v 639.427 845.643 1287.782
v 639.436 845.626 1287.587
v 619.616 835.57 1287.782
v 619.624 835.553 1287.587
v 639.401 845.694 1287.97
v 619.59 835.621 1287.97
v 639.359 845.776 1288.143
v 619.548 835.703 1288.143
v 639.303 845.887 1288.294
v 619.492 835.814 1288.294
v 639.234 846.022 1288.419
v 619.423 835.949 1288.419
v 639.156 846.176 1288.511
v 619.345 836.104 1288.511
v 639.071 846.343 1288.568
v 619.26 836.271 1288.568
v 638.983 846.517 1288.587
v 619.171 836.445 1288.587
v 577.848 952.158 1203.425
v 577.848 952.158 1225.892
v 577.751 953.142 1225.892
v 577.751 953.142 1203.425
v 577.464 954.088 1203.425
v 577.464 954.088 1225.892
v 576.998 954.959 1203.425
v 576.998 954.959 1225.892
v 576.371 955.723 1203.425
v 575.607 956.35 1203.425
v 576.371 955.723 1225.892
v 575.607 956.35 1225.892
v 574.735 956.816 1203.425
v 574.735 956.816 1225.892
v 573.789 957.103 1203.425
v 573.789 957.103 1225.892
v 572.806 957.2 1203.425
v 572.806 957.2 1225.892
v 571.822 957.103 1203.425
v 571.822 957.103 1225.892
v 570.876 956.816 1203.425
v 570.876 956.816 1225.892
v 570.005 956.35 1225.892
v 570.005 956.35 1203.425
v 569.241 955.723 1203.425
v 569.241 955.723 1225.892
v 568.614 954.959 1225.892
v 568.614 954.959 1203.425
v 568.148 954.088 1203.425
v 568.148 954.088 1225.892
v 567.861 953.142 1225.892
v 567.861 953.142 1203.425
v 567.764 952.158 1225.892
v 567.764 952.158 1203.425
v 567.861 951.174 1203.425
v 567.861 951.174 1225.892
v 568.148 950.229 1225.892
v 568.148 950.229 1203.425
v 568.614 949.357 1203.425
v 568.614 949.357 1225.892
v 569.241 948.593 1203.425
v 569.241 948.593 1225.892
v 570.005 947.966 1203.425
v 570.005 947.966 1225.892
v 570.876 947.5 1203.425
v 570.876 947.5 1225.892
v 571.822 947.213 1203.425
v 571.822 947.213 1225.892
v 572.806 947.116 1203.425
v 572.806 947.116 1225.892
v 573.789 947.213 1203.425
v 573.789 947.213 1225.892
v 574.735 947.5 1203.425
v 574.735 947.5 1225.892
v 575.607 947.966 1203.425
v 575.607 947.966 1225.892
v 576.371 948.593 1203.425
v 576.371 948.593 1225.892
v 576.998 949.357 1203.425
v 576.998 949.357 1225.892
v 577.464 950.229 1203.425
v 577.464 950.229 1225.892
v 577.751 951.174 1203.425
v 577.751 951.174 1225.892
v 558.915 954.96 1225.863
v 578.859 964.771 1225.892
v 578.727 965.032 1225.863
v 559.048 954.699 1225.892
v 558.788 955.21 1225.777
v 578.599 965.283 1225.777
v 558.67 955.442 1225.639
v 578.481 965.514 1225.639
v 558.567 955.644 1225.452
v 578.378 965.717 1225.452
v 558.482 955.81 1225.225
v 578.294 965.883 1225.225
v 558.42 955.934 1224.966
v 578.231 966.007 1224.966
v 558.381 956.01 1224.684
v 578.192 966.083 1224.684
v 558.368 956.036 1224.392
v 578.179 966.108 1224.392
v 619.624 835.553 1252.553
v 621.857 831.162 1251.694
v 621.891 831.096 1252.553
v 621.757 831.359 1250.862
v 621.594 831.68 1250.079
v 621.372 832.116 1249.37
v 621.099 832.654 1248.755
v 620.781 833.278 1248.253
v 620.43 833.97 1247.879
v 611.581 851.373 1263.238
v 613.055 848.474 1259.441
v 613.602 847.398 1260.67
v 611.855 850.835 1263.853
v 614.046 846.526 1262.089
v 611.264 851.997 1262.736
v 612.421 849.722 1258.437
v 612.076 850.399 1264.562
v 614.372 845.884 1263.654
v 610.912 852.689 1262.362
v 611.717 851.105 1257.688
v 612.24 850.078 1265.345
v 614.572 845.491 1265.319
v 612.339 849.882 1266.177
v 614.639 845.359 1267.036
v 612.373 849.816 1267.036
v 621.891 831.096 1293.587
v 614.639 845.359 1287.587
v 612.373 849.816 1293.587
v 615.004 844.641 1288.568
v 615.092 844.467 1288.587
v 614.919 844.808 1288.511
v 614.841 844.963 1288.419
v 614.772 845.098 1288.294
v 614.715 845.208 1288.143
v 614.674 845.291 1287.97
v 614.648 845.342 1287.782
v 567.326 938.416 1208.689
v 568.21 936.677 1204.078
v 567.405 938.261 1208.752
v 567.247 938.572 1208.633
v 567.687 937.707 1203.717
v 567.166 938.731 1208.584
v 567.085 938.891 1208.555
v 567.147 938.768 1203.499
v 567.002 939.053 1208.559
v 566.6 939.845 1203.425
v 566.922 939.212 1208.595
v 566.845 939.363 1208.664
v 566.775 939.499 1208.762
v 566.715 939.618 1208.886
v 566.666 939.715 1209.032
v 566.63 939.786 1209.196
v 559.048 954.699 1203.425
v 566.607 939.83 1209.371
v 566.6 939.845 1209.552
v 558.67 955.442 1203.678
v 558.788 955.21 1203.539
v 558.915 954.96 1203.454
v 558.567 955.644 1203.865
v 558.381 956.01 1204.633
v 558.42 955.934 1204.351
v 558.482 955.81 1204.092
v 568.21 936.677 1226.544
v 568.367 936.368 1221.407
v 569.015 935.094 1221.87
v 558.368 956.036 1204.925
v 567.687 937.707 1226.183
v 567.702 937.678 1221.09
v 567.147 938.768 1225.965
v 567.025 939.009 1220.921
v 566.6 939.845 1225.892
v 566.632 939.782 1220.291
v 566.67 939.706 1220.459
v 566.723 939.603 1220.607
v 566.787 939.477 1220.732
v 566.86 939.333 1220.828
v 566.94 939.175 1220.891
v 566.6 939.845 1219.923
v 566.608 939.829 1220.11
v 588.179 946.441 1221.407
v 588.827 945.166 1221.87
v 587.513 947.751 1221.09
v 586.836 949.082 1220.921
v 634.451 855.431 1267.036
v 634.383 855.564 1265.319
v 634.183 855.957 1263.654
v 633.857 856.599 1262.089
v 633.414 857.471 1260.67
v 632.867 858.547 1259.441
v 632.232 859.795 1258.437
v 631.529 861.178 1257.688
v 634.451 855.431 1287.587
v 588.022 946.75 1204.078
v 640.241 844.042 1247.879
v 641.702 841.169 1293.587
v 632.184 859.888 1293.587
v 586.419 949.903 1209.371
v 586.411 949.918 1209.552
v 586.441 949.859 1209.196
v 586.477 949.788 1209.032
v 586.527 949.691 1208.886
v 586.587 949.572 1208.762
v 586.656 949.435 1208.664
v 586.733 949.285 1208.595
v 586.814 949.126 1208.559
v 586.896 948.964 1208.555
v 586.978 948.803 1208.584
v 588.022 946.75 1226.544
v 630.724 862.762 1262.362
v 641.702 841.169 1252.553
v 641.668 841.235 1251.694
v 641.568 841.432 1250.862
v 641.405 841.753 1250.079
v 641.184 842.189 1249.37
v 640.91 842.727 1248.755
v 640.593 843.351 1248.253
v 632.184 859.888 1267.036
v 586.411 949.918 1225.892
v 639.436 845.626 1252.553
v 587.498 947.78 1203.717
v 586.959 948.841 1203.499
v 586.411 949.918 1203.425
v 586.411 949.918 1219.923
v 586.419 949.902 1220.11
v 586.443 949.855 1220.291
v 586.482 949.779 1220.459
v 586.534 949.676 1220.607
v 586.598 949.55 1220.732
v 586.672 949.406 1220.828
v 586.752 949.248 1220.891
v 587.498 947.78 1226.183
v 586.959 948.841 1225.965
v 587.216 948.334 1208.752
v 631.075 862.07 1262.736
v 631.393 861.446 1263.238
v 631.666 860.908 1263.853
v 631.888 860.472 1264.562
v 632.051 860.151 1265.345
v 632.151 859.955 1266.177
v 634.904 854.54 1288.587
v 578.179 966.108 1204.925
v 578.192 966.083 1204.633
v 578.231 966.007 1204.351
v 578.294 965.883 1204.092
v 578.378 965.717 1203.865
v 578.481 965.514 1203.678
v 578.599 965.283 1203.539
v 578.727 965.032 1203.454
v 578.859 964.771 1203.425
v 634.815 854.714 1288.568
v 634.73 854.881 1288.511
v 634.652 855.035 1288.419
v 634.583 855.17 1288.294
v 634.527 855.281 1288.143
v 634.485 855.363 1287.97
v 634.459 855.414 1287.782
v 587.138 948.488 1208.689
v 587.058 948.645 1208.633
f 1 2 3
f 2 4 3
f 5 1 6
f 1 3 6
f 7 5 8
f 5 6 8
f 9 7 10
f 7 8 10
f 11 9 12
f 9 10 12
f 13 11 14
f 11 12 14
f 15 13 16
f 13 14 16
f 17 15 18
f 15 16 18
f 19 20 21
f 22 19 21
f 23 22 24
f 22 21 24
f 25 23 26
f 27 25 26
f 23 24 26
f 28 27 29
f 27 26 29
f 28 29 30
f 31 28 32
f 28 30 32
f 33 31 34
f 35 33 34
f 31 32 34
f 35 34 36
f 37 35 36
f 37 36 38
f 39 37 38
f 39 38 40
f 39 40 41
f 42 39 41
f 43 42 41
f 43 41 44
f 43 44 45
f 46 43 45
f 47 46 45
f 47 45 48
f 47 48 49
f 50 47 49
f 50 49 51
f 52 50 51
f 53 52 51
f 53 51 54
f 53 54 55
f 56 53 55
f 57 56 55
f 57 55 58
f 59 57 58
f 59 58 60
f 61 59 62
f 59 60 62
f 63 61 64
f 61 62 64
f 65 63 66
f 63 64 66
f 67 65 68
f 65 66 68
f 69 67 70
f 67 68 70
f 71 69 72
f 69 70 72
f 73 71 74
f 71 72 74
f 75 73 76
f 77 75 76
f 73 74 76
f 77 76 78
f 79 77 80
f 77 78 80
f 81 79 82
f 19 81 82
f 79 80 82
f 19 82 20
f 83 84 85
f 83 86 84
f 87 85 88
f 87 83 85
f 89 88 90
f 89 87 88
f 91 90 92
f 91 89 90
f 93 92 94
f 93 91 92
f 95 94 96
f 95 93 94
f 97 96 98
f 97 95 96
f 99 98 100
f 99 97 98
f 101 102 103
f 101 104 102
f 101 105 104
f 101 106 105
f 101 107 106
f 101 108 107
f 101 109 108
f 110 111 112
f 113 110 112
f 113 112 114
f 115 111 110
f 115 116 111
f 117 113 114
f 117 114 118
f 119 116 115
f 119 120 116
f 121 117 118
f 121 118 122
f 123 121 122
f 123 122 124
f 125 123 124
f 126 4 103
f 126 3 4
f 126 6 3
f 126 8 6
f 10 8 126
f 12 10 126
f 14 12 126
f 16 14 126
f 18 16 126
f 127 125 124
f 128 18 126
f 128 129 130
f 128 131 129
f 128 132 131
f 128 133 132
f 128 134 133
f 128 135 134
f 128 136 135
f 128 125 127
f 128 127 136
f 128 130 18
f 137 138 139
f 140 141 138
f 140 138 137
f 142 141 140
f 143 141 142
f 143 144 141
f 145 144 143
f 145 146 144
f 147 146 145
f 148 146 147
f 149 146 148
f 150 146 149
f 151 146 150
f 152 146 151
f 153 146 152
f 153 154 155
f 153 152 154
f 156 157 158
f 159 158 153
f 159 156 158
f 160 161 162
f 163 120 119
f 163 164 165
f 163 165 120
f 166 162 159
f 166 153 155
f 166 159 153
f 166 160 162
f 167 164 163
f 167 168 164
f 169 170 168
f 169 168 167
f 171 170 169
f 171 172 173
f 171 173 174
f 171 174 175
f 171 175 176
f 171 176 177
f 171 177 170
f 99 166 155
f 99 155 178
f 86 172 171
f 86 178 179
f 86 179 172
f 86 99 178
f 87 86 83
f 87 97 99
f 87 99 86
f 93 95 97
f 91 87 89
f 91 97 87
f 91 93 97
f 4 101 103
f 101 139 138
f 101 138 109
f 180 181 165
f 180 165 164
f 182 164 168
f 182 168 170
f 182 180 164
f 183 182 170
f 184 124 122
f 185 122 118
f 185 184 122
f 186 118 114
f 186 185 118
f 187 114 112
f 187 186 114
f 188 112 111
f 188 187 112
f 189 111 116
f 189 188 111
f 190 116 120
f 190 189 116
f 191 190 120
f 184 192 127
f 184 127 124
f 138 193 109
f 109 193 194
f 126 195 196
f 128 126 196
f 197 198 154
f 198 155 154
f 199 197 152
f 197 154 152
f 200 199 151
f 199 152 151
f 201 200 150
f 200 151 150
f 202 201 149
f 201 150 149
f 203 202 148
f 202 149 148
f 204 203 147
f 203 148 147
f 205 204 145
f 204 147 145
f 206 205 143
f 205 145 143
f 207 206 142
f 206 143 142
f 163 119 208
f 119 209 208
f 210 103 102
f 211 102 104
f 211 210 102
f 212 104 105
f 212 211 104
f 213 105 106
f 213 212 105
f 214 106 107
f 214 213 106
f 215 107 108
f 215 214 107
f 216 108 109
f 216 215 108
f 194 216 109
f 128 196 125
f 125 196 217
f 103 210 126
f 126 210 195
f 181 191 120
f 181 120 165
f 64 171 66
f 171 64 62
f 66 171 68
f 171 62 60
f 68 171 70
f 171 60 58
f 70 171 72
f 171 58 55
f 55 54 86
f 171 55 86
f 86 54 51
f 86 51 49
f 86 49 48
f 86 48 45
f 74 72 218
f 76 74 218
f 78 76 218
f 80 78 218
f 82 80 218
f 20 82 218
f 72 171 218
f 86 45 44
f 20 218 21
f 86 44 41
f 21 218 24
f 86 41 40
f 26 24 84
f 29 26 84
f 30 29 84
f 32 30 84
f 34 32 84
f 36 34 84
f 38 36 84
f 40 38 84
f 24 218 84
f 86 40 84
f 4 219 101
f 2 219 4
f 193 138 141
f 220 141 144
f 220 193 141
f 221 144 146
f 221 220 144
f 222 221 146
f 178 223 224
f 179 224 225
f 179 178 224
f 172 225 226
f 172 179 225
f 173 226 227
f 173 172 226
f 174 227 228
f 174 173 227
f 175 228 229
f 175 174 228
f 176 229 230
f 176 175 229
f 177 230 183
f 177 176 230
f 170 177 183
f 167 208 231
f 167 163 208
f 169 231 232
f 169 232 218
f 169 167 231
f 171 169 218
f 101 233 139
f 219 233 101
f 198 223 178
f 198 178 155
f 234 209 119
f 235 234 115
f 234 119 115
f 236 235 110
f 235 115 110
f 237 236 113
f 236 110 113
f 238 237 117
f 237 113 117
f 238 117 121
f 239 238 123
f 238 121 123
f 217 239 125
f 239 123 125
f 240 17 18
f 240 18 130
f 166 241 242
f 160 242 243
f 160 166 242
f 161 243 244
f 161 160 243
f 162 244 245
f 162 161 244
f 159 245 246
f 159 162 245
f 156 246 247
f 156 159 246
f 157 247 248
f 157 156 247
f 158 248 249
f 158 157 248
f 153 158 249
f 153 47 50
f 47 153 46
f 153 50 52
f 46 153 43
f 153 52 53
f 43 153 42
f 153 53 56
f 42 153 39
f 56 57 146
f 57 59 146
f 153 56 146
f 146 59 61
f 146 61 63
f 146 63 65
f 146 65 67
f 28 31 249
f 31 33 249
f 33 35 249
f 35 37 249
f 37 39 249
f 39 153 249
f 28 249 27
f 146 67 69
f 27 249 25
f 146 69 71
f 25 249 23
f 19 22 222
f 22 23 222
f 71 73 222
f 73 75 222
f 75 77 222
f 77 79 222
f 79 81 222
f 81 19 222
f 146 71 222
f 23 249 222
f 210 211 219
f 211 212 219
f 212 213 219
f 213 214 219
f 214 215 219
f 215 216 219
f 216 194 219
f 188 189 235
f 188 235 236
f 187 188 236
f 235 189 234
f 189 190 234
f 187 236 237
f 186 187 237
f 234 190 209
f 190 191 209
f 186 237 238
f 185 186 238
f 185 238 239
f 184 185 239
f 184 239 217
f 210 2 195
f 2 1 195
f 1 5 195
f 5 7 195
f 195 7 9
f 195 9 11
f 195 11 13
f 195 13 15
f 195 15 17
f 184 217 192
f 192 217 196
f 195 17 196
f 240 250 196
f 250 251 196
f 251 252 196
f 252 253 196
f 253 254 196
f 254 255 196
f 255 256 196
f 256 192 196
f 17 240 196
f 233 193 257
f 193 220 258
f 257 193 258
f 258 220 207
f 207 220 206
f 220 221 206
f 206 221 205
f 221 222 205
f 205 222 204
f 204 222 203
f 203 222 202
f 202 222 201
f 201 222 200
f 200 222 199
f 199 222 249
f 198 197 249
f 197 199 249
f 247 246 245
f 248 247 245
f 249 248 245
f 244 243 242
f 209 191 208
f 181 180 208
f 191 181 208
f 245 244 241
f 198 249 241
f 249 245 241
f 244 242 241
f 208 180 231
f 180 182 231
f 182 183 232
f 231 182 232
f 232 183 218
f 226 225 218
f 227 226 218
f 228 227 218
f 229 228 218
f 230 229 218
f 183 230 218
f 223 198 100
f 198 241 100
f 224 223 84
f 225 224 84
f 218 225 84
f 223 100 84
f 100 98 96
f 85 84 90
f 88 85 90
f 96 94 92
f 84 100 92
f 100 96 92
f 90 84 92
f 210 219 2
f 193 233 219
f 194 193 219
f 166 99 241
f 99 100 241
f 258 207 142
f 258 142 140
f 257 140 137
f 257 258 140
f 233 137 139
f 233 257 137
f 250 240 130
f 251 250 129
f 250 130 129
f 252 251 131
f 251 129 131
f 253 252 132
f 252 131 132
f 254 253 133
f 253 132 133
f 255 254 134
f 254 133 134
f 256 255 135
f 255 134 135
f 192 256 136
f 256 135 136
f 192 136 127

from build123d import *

# Parameters (mm, degrees)
BOSS_EXTRUDE1_DEPTH     = 11.1125
F_3_8_CLEARANCE_HOLE1_D = 10.0838
FILLET1_R               = 10
FILLET2_R               = 5
FILLET3_R               = 1.5
CUT_EXTRUDE1_REACH      = 1431.512
FILLET4_R               = 1


with BuildPart() as part:
    # Sketch4 → Boss-Extrude1 (new, symmetric)
    with BuildSketch(Plane(origin=(839.854692927, 426.912410879, 0), x_dir=(0, 0, -1), z_dir=(0.89140236631763, 0.4532127770962882, 0))):
        Polygon((-1293.587379373, 459.074586593), (-1293.587379373, 480.074586593), (-1263.587379373, 480.074586593), (-1225.891521519, 579.235261263), (-1225.891521519, 599.235261263), (-1203.425314933, 599.235261263), (-1203.425314933, 579.235261263), (-1249.104307407, 459.074586593), align=None)
    extrude(amount=BOSS_EXTRUDE1_DEPTH, both=True)

    # 3/8 Clearance Hole1 (through all)
    with Locations(Plane(origin=(0, 0, 1203.425314933), x_dir=(-1, 0, 0), z_dir=(0, 0, -1))):
        with Locations((-572.805743807, 952.158117087)):
            Hole(F_3_8_CLEARANCE_HOLE1_D / 2)

    # Fillet1
    fillet1_edges = [part.edges().sort_by_distance(p)[0] for p in [
        (577.337871578, 943.244093424, 1225.891521519),
        (577.337871578, 943.244093424, 1203.425314933),
    ]]
    fillet(fillet1_edges, radius=FILLET1_R)

    # Fillet2
    fillet2_edges = [part.edges().sort_by_distance(p)[0] for p in [
        (622.278756323, 854.852033377, 1263.587379373),
        (631.796224642, 836.132583685, 1249.104307407),
    ]]
    fillet(fillet2_edges, radius=FILLET2_R)

    # Fillet3
    fillet3_edges = [part.edges().sort_by_distance(p)[0] for p in [
        (568.273616036, 961.07214075, 1225.891521519),
        (568.273616036, 961.07214075, 1203.425314933),
    ]]
    fillet(fillet3_edges, radius=FILLET3_R)

    # Sketch9 → Cut-Extrude1 (cut, up to next)
    with BuildSketch(Plane(origin=(849.723172799, 432.02196164, 0), x_dir=(0, 0, -1), z_dir=(0.8914023663176289, 0.4532127770962904, 1.344287086354073e-15)), mode=Mode.PRIVATE) as cut_extrude1_sk1:
        with BuildLine():
            Line((-1220.891521519, 580.989746958), (-1208.425314933, 580.989746958))
            ThreePointArc((-1208.425314933, 580.989746958), (-1208.507569969, 580.086539083), (-1208.751628719, 579.213048567))
            Line((-1208.751628719, 579.213048567), (-1252.552657875, 463.992442123))
            Line((-1252.552657875, 463.992442123), (-1288.587379373, 463.992442123))
            Line((-1288.587379373, 463.992442123), (-1288.587379373, 474.992442123))
            Line((-1288.587379373, 474.992442123), (-1267.035729841, 474.992442123))
            ThreePointArc((-1267.035729841, 474.992442123), (-1261.358317042, 476.760371671), (-1257.688357413, 481.43904534))
            Line((-1257.688357413, 481.43904534), (-1221.870462877, 575.659651784))
            ThreePointArc((-1221.870462877, 575.659651784), (-1221.138286626, 578.280123334), (-1220.891521519, 580.989746958))
        make_face()
    cut_extrude1_tool1 = extrude(cut_extrude1_sk1.sketch, amount=-CUT_EXTRUDE1_REACH, mode=Mode.PRIVATE) & part.part
    add(cut_extrude1_tool1.solids().sort_by_distance((617.145834, 889.467119, 1243.085905))[0], mode=Mode.SUBTRACT)

    # Fillet4
    fillet4_edges = [part.edges().sort_by_distance(p)[0] for p in [
        (576.50548732, 944.8812699, 1208.425314933),
        (629.530160757, 840.589595516, 1288.587379373),
        (624.544820209, 850.395021546, 1288.587379373),
        (576.50548732, 944.8812699, 1220.891521519),
    ]]
    fillet(fillet4_edges, radius=FILLET4_R)


solid = part.part
